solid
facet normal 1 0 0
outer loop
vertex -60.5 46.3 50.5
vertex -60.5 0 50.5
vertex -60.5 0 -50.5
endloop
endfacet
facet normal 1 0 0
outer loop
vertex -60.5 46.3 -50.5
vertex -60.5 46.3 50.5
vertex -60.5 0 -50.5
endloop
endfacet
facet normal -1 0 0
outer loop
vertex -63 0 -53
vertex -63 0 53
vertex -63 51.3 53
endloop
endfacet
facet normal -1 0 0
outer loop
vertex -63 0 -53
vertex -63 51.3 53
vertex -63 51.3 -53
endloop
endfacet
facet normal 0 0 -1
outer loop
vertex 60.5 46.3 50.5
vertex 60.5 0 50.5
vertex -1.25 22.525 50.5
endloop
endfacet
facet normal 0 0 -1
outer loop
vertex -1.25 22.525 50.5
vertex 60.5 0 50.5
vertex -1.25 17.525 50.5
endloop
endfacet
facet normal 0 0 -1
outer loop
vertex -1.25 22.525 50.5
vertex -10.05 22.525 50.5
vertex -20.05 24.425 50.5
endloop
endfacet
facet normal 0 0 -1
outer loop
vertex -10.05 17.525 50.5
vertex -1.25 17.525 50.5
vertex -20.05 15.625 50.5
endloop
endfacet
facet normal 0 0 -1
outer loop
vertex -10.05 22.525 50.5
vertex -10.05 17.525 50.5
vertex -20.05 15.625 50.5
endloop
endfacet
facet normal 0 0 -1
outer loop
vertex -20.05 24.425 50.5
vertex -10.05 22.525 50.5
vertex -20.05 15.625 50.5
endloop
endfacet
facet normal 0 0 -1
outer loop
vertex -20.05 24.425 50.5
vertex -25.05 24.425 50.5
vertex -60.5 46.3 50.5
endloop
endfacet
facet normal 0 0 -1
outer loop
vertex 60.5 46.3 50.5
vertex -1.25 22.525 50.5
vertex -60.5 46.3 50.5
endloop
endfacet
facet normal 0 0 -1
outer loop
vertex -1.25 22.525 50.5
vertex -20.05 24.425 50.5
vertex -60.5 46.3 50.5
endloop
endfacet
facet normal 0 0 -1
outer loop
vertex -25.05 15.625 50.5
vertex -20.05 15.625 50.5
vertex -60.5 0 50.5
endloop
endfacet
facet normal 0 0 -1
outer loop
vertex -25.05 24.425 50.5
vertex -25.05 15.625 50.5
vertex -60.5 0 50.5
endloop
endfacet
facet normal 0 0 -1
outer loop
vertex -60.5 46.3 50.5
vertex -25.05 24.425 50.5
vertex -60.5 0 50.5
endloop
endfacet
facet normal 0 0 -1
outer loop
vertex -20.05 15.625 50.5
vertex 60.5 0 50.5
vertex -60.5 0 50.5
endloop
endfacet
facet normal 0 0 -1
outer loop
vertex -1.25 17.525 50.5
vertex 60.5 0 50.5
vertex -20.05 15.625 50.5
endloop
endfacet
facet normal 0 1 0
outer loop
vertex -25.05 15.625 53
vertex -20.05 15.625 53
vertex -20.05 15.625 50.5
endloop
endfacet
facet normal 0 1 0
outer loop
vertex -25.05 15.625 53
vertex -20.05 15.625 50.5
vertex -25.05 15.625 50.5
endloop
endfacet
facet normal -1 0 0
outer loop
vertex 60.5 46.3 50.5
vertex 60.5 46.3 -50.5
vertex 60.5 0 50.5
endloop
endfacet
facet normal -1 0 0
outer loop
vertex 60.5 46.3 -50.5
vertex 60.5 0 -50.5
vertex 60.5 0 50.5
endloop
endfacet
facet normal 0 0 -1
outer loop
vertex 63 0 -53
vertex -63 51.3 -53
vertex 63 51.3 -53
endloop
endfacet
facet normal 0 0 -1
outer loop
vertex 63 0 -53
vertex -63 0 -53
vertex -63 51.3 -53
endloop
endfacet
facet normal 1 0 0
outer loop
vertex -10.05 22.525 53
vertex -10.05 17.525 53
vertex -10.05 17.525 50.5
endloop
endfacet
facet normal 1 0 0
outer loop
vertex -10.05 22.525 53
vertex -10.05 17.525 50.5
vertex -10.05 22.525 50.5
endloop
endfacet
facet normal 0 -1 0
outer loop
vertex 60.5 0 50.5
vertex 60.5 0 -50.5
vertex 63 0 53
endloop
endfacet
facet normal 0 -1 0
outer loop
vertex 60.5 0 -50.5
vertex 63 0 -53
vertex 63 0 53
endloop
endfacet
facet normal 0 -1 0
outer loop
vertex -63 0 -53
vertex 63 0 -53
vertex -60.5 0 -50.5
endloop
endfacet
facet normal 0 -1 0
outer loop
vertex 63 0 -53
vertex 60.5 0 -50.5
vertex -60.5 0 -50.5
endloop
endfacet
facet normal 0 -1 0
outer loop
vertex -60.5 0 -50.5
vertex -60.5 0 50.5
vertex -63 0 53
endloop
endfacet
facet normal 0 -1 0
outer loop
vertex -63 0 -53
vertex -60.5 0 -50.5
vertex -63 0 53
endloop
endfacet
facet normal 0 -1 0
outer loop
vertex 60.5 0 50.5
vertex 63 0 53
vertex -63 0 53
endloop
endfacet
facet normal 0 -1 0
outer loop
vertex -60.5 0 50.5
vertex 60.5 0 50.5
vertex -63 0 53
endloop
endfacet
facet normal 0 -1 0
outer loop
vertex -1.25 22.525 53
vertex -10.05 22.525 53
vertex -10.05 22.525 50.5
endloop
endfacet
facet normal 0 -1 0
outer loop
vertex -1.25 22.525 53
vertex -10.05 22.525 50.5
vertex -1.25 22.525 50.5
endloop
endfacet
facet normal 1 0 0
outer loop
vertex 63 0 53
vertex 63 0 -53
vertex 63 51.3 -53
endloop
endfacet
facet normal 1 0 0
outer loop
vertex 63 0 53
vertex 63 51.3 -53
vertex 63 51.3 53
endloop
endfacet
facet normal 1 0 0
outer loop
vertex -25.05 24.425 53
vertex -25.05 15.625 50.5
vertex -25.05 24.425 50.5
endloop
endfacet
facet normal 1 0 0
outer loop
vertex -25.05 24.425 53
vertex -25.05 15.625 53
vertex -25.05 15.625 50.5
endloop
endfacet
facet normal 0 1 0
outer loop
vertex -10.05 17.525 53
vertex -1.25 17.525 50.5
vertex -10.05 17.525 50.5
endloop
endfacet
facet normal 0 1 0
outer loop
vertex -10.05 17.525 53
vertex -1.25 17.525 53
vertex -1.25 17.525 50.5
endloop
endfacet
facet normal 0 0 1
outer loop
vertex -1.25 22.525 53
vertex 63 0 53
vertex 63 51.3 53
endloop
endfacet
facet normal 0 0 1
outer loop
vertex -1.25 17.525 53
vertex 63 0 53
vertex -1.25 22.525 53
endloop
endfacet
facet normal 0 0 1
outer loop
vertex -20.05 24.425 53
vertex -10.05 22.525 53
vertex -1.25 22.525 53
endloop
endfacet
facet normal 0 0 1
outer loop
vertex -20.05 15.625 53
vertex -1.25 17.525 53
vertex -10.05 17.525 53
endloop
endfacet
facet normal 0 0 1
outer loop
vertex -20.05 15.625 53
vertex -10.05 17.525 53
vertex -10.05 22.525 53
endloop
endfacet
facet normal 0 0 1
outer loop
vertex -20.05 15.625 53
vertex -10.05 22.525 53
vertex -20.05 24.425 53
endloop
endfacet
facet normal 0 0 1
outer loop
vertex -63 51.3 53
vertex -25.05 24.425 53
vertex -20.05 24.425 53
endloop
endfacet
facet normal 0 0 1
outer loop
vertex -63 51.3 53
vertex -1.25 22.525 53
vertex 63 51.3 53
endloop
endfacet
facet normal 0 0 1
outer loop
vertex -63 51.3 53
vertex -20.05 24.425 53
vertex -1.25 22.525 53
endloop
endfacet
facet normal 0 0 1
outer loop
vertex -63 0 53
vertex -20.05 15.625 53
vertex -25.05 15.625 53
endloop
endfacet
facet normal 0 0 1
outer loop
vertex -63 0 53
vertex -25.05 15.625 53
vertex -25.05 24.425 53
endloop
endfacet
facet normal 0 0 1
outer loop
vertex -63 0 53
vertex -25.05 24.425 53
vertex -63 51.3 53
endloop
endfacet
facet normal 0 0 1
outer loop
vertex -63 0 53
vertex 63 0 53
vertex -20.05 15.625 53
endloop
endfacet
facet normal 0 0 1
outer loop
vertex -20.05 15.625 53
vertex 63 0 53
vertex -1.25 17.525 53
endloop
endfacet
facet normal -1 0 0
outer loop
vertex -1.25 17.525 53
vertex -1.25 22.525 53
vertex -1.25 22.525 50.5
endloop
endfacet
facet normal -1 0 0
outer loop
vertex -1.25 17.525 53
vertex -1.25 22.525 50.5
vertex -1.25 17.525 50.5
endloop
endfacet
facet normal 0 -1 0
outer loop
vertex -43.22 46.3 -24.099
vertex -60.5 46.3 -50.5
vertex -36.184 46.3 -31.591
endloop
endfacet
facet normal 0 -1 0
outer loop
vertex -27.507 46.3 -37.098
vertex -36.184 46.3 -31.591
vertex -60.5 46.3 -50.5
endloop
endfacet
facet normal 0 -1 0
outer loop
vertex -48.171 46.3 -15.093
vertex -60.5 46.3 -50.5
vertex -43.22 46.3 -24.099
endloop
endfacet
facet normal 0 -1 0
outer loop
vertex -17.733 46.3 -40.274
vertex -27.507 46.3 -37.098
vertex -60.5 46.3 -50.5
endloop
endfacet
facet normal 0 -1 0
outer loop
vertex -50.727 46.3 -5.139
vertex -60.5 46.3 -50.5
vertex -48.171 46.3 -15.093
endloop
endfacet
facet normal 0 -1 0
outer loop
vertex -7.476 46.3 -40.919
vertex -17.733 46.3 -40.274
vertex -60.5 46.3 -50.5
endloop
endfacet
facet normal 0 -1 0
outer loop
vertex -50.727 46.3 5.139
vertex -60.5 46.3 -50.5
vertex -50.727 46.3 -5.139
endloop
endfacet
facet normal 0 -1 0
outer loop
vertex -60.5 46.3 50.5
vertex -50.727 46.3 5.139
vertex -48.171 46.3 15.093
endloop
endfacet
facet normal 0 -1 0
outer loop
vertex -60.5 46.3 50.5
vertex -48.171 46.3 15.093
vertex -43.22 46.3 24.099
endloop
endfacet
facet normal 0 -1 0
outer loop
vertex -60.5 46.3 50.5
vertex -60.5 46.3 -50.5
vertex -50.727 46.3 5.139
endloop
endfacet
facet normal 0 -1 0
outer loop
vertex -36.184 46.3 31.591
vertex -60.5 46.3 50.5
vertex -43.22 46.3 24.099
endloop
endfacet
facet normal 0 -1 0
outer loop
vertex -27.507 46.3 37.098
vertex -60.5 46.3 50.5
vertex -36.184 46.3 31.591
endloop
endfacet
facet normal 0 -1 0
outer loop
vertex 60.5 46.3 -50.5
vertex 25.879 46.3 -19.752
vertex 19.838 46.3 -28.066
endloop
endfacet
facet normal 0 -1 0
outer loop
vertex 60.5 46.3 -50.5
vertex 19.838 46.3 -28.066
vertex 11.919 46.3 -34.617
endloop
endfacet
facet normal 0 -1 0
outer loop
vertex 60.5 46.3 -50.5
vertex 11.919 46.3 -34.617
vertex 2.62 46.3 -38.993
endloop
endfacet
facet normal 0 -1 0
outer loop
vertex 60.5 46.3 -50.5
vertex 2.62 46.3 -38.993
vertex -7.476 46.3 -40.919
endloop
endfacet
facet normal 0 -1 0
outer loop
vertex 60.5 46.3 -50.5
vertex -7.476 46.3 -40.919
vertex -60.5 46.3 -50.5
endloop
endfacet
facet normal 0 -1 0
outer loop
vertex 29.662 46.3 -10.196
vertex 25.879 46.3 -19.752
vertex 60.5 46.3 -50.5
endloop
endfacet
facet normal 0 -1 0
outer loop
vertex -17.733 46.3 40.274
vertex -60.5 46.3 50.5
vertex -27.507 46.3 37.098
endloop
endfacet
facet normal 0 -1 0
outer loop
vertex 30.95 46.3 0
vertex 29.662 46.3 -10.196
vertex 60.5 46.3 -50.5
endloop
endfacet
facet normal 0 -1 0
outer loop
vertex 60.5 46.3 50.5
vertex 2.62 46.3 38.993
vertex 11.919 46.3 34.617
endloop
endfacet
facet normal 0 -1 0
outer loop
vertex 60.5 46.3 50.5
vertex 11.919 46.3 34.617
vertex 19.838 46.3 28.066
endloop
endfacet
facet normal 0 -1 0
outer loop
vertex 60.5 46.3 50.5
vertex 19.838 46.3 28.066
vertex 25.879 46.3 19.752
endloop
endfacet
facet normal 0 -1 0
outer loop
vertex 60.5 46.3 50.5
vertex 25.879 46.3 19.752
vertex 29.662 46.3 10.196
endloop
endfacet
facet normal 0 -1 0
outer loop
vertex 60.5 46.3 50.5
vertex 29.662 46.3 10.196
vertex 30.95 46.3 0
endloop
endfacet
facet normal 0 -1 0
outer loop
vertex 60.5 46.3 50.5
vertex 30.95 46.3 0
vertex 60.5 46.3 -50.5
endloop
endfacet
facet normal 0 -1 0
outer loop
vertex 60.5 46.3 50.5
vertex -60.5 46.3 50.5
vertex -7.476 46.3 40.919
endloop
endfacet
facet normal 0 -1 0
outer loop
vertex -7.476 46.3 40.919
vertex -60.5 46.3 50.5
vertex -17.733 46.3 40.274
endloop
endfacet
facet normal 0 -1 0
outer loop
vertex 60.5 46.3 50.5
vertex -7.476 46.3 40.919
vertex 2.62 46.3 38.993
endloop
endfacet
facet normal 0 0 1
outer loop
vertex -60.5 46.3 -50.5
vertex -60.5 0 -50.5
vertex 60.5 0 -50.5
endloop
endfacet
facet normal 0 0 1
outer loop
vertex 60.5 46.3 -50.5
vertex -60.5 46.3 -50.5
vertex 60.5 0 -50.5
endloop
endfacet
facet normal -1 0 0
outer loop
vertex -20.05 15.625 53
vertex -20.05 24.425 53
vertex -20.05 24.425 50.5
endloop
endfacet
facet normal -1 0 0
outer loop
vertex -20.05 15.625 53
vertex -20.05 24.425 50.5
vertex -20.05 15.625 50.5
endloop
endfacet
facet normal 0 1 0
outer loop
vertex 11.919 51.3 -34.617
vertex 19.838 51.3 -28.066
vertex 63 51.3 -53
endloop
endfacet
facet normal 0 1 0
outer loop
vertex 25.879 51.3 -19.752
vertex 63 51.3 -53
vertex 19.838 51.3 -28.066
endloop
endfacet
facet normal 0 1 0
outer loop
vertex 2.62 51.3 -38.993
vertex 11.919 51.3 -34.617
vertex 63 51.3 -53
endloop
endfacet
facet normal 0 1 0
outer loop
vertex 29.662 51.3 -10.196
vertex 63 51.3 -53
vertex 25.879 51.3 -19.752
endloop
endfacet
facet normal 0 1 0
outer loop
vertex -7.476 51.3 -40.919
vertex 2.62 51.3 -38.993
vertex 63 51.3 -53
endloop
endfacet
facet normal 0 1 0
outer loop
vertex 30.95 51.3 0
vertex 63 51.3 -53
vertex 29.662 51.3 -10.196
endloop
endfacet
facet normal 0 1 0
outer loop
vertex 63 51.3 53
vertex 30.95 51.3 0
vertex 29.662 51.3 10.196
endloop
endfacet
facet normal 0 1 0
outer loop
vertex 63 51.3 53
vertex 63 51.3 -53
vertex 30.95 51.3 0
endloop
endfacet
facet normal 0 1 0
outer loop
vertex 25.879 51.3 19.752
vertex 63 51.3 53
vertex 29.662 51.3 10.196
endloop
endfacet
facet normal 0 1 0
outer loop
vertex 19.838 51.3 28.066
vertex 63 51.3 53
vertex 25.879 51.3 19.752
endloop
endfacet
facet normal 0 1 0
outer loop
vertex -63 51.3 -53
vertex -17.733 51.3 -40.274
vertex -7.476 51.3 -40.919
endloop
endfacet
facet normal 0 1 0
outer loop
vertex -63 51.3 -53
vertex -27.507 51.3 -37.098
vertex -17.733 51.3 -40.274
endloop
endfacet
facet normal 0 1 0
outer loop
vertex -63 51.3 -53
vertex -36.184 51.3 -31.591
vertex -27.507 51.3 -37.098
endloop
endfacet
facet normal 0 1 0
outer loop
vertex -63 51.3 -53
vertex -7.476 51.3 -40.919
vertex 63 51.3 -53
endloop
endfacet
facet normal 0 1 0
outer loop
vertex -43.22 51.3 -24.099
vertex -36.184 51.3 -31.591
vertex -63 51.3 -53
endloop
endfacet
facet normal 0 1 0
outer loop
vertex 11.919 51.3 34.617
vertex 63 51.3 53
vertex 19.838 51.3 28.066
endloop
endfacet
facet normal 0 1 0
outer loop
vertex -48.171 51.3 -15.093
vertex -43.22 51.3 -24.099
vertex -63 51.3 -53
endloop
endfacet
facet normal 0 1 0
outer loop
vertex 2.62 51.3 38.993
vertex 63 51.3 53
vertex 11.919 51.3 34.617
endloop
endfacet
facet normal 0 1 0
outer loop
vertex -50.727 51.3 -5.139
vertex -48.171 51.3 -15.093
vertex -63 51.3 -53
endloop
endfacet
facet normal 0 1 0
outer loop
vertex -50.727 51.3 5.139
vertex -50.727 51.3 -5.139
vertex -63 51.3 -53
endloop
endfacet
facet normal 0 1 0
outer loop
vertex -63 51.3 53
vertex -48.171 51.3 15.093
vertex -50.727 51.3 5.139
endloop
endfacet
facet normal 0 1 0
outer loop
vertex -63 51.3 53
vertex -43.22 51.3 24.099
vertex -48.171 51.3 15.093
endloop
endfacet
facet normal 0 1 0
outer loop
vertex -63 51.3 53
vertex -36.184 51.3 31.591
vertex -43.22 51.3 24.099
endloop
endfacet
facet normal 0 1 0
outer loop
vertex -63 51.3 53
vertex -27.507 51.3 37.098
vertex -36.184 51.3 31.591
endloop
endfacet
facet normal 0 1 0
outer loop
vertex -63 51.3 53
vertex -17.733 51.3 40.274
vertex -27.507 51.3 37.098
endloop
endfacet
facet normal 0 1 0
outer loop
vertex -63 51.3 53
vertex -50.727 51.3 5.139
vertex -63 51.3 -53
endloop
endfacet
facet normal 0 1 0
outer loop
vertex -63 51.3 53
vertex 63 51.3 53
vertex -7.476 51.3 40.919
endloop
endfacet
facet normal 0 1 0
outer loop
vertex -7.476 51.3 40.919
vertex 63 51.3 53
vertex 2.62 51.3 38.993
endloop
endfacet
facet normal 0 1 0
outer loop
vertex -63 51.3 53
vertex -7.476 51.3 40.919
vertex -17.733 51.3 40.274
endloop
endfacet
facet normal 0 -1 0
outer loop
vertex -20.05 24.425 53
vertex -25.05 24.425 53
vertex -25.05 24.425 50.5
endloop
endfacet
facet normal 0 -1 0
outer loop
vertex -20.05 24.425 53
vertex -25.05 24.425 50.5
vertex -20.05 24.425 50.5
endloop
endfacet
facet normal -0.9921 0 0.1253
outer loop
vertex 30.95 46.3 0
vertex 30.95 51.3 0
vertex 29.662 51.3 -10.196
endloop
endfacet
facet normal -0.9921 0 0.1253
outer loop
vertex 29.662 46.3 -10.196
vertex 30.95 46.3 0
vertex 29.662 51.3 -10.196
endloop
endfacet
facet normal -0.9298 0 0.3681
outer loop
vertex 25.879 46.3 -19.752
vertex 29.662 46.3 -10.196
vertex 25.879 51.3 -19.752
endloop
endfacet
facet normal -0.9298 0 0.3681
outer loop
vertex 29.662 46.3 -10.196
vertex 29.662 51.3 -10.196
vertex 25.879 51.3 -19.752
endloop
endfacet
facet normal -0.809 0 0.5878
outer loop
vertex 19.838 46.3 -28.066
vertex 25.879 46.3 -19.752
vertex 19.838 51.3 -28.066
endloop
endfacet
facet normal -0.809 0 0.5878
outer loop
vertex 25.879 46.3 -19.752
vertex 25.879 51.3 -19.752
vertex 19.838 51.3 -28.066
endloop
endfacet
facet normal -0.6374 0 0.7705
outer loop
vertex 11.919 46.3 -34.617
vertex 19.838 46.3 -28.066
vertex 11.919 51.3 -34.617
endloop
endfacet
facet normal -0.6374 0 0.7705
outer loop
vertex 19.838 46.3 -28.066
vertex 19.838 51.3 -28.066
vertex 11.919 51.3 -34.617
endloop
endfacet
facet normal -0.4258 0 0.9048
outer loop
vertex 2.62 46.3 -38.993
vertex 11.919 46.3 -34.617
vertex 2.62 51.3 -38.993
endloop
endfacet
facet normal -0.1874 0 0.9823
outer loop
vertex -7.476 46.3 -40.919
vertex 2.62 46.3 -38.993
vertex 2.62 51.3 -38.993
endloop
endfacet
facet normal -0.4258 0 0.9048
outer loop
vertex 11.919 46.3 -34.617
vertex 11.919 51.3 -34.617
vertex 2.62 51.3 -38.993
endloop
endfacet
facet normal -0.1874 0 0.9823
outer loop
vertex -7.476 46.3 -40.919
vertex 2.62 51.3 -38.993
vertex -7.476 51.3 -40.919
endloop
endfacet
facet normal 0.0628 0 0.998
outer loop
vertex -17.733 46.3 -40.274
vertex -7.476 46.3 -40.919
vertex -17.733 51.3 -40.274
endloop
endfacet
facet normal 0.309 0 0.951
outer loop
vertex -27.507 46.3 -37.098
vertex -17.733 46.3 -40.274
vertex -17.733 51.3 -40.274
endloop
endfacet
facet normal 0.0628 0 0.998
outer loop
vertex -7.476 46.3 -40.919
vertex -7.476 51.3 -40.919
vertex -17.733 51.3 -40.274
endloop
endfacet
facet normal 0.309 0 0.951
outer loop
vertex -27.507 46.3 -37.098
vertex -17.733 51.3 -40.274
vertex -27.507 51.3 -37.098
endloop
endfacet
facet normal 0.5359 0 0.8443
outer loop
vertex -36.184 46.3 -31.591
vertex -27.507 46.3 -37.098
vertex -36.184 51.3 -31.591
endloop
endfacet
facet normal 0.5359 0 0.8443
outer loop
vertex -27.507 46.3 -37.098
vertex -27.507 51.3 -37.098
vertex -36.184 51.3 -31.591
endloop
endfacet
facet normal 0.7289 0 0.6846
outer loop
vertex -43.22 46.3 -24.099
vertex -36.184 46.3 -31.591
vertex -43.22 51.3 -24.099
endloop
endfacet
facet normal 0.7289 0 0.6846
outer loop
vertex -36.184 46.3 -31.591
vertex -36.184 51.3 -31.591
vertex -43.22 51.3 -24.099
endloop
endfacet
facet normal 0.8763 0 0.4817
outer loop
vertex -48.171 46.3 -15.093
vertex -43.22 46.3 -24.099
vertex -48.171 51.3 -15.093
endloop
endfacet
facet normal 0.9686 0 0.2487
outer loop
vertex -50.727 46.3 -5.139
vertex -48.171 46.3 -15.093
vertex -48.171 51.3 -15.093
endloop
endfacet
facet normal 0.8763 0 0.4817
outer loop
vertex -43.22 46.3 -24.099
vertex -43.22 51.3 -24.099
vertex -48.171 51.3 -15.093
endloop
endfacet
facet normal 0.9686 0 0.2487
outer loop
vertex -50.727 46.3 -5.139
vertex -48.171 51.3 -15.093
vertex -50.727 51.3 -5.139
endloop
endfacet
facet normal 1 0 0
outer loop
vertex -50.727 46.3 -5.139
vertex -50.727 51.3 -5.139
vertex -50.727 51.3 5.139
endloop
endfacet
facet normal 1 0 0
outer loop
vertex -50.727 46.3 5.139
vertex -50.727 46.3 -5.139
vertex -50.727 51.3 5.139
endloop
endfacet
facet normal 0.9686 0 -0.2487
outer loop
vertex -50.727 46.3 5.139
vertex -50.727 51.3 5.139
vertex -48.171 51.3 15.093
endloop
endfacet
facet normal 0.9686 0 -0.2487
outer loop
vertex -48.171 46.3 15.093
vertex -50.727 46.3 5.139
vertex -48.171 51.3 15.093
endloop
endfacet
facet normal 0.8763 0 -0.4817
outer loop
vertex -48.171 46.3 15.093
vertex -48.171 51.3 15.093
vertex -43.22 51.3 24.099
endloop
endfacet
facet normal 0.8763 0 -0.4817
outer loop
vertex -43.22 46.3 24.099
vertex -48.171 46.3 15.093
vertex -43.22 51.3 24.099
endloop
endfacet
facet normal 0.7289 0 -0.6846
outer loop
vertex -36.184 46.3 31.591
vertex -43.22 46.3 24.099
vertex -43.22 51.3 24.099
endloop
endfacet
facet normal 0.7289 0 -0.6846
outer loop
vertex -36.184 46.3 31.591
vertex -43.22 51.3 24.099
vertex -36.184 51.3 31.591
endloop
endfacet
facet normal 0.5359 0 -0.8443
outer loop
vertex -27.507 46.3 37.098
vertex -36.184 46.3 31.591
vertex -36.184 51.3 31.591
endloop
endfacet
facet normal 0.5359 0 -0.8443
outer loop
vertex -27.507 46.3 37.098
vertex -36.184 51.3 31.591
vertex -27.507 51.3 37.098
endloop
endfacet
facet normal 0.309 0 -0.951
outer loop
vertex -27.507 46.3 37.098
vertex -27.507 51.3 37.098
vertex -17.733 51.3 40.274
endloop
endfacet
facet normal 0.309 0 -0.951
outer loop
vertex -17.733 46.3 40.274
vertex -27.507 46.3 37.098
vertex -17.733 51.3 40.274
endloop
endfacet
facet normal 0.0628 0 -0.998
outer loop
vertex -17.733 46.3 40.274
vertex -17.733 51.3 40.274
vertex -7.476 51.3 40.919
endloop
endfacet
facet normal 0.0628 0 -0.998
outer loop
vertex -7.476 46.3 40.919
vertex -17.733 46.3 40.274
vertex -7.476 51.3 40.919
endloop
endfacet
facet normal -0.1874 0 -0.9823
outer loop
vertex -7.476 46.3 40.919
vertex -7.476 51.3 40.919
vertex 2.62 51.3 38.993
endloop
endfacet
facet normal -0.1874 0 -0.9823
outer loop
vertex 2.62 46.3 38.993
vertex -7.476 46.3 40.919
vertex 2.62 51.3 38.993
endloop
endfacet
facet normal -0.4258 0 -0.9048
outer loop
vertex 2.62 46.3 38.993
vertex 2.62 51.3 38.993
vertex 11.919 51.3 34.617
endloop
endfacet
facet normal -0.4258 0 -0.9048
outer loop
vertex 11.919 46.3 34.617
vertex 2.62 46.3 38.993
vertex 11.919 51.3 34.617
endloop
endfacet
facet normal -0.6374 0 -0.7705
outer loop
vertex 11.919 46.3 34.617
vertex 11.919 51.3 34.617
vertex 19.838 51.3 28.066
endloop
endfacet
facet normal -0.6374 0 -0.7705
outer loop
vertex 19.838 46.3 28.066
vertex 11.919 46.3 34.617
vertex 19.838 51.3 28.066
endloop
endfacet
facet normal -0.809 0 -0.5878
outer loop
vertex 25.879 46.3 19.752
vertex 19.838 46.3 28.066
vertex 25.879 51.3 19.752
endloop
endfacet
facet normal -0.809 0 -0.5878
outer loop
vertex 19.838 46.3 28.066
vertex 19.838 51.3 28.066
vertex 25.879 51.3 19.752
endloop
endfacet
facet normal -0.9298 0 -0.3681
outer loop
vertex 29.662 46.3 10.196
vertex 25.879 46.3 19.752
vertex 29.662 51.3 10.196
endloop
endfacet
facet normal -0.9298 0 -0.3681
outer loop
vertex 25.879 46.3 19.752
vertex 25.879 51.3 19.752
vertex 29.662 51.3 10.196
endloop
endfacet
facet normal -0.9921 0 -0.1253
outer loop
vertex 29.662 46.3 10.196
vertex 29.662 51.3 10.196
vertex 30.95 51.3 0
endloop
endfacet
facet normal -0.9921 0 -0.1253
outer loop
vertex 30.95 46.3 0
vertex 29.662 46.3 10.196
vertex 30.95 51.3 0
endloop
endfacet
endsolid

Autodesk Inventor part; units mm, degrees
ref_plane "YZ Plane" through (0, 0, 0) normal (1, 0, 0) x (0, 1, 0)
ref_plane "XZ Plane" through (0, 0, 0) normal (0, 1, 0) x (-1, 0, 0)
ref_plane "XY Plane" through (0, 0, 0) normal (0, 0, 1) x (1, 0, 0)
sketch "Sketch1" plane through (0, 0, 0) normal (0, 1, 0) x (-1, 0, 0)
  line L0 (63, -53) -> (-63, -53)
  line L1 (-63, -53) -> (-63, 53)
  line L2 (-63, 53) -> (63, 53)
  line L3 (63, 53) -> (63, -53)
  point P0 (0, 0)
  point P1 (63, 0)
  point P2 (0, -53)
  dimension "d0" = 126
  dimension "d1" = 106
extrude "Extrusion1" add sketch "Sketch1" along normal blind 51.3
sketch "Sketch2" plane through (0, 0, 0) normal (0, -1, 0) x (1, 0, 0)
  line L0 (60.5, 50.5) -> (-60.5, 50.5)
  line L1 (-60.5, 50.5) -> (-60.5, -50.5)
  line L2 (-60.5, -50.5) -> (60.5, -50.5)
  line L3 (60.5, -50.5) -> (60.5, 50.5)
  line L4 (63, 53) -> (63, -53) projected
  line L5 (-63, 53) -> (63, 53) projected
  point P0 (0, 0)
  point P1 (60.5, 0)
  point P2 (0, 50.5)
  dimension "d8" = 2.5
  dimension "d9" = 2.5
extrude "Extrusion2" cut sketch "Sketch2" against normal blind 46.3
sketch "Sketch3" plane through (0, 51.3, 0) normal (0, 1, 0) x (1, 0, 0)
  circle A0 centre (-10.05, 0) radius 41
  line L0 (63, -53) -> (63, 53) projected
  point P0 (0, 0)
  point P1 (63, 0)
  dimension "d12" = 82
  dimension "d13" = 73.05
extrude "Extrusion3" cut sketch "Sketch3" against normal blind 46.3
sketch "Sketch4" plane through (-63, 0, 53) normal (0, 0, 1) x (1, 0, 0)
  line L0 (37.95, 24.425) -> (42.95, 24.425)
  line L1 (42.95, 24.425) -> (42.95, 15.625)
  line L2 (42.95, 15.625) -> (37.95, 15.625)
  line L3 (37.95, 15.625) -> (37.95, 24.425)
  line L4 (0, 0) -> (126, 0) projected
  line L5 (0, 0) -> (0, 51.3) projected
  line L6 (52.95, 22.525) -> (61.75, 22.525)
  line L7 (61.75, 22.525) -> (61.75, 17.525)
  line L8 (61.75, 17.525) -> (52.95, 17.525)
  line L9 (52.95, 17.525) -> (52.95, 22.525)
  point P0 (63, 0)
  point P1 (57.35, 17.525)
  point P2 (40.45, 15.625)
  point P3 (42.95, 20.025)
  point P4 (52.95, 20.025)
  dimension "d16" = 5
  dimension "d17" = 8.8
  dimension "d18" = 15.625
  dimension "d19" = 37.95
  dimension "d20" = 8.8
  dimension "d21" = 5
  dimension "d22" = 10
extrude "Extrusion4" cut sketch "Sketch4" against normal blind 10
equation "\"d20\" = d17"
equation "\"d21\" = d16"
properties part number "Bottom_Cover"
